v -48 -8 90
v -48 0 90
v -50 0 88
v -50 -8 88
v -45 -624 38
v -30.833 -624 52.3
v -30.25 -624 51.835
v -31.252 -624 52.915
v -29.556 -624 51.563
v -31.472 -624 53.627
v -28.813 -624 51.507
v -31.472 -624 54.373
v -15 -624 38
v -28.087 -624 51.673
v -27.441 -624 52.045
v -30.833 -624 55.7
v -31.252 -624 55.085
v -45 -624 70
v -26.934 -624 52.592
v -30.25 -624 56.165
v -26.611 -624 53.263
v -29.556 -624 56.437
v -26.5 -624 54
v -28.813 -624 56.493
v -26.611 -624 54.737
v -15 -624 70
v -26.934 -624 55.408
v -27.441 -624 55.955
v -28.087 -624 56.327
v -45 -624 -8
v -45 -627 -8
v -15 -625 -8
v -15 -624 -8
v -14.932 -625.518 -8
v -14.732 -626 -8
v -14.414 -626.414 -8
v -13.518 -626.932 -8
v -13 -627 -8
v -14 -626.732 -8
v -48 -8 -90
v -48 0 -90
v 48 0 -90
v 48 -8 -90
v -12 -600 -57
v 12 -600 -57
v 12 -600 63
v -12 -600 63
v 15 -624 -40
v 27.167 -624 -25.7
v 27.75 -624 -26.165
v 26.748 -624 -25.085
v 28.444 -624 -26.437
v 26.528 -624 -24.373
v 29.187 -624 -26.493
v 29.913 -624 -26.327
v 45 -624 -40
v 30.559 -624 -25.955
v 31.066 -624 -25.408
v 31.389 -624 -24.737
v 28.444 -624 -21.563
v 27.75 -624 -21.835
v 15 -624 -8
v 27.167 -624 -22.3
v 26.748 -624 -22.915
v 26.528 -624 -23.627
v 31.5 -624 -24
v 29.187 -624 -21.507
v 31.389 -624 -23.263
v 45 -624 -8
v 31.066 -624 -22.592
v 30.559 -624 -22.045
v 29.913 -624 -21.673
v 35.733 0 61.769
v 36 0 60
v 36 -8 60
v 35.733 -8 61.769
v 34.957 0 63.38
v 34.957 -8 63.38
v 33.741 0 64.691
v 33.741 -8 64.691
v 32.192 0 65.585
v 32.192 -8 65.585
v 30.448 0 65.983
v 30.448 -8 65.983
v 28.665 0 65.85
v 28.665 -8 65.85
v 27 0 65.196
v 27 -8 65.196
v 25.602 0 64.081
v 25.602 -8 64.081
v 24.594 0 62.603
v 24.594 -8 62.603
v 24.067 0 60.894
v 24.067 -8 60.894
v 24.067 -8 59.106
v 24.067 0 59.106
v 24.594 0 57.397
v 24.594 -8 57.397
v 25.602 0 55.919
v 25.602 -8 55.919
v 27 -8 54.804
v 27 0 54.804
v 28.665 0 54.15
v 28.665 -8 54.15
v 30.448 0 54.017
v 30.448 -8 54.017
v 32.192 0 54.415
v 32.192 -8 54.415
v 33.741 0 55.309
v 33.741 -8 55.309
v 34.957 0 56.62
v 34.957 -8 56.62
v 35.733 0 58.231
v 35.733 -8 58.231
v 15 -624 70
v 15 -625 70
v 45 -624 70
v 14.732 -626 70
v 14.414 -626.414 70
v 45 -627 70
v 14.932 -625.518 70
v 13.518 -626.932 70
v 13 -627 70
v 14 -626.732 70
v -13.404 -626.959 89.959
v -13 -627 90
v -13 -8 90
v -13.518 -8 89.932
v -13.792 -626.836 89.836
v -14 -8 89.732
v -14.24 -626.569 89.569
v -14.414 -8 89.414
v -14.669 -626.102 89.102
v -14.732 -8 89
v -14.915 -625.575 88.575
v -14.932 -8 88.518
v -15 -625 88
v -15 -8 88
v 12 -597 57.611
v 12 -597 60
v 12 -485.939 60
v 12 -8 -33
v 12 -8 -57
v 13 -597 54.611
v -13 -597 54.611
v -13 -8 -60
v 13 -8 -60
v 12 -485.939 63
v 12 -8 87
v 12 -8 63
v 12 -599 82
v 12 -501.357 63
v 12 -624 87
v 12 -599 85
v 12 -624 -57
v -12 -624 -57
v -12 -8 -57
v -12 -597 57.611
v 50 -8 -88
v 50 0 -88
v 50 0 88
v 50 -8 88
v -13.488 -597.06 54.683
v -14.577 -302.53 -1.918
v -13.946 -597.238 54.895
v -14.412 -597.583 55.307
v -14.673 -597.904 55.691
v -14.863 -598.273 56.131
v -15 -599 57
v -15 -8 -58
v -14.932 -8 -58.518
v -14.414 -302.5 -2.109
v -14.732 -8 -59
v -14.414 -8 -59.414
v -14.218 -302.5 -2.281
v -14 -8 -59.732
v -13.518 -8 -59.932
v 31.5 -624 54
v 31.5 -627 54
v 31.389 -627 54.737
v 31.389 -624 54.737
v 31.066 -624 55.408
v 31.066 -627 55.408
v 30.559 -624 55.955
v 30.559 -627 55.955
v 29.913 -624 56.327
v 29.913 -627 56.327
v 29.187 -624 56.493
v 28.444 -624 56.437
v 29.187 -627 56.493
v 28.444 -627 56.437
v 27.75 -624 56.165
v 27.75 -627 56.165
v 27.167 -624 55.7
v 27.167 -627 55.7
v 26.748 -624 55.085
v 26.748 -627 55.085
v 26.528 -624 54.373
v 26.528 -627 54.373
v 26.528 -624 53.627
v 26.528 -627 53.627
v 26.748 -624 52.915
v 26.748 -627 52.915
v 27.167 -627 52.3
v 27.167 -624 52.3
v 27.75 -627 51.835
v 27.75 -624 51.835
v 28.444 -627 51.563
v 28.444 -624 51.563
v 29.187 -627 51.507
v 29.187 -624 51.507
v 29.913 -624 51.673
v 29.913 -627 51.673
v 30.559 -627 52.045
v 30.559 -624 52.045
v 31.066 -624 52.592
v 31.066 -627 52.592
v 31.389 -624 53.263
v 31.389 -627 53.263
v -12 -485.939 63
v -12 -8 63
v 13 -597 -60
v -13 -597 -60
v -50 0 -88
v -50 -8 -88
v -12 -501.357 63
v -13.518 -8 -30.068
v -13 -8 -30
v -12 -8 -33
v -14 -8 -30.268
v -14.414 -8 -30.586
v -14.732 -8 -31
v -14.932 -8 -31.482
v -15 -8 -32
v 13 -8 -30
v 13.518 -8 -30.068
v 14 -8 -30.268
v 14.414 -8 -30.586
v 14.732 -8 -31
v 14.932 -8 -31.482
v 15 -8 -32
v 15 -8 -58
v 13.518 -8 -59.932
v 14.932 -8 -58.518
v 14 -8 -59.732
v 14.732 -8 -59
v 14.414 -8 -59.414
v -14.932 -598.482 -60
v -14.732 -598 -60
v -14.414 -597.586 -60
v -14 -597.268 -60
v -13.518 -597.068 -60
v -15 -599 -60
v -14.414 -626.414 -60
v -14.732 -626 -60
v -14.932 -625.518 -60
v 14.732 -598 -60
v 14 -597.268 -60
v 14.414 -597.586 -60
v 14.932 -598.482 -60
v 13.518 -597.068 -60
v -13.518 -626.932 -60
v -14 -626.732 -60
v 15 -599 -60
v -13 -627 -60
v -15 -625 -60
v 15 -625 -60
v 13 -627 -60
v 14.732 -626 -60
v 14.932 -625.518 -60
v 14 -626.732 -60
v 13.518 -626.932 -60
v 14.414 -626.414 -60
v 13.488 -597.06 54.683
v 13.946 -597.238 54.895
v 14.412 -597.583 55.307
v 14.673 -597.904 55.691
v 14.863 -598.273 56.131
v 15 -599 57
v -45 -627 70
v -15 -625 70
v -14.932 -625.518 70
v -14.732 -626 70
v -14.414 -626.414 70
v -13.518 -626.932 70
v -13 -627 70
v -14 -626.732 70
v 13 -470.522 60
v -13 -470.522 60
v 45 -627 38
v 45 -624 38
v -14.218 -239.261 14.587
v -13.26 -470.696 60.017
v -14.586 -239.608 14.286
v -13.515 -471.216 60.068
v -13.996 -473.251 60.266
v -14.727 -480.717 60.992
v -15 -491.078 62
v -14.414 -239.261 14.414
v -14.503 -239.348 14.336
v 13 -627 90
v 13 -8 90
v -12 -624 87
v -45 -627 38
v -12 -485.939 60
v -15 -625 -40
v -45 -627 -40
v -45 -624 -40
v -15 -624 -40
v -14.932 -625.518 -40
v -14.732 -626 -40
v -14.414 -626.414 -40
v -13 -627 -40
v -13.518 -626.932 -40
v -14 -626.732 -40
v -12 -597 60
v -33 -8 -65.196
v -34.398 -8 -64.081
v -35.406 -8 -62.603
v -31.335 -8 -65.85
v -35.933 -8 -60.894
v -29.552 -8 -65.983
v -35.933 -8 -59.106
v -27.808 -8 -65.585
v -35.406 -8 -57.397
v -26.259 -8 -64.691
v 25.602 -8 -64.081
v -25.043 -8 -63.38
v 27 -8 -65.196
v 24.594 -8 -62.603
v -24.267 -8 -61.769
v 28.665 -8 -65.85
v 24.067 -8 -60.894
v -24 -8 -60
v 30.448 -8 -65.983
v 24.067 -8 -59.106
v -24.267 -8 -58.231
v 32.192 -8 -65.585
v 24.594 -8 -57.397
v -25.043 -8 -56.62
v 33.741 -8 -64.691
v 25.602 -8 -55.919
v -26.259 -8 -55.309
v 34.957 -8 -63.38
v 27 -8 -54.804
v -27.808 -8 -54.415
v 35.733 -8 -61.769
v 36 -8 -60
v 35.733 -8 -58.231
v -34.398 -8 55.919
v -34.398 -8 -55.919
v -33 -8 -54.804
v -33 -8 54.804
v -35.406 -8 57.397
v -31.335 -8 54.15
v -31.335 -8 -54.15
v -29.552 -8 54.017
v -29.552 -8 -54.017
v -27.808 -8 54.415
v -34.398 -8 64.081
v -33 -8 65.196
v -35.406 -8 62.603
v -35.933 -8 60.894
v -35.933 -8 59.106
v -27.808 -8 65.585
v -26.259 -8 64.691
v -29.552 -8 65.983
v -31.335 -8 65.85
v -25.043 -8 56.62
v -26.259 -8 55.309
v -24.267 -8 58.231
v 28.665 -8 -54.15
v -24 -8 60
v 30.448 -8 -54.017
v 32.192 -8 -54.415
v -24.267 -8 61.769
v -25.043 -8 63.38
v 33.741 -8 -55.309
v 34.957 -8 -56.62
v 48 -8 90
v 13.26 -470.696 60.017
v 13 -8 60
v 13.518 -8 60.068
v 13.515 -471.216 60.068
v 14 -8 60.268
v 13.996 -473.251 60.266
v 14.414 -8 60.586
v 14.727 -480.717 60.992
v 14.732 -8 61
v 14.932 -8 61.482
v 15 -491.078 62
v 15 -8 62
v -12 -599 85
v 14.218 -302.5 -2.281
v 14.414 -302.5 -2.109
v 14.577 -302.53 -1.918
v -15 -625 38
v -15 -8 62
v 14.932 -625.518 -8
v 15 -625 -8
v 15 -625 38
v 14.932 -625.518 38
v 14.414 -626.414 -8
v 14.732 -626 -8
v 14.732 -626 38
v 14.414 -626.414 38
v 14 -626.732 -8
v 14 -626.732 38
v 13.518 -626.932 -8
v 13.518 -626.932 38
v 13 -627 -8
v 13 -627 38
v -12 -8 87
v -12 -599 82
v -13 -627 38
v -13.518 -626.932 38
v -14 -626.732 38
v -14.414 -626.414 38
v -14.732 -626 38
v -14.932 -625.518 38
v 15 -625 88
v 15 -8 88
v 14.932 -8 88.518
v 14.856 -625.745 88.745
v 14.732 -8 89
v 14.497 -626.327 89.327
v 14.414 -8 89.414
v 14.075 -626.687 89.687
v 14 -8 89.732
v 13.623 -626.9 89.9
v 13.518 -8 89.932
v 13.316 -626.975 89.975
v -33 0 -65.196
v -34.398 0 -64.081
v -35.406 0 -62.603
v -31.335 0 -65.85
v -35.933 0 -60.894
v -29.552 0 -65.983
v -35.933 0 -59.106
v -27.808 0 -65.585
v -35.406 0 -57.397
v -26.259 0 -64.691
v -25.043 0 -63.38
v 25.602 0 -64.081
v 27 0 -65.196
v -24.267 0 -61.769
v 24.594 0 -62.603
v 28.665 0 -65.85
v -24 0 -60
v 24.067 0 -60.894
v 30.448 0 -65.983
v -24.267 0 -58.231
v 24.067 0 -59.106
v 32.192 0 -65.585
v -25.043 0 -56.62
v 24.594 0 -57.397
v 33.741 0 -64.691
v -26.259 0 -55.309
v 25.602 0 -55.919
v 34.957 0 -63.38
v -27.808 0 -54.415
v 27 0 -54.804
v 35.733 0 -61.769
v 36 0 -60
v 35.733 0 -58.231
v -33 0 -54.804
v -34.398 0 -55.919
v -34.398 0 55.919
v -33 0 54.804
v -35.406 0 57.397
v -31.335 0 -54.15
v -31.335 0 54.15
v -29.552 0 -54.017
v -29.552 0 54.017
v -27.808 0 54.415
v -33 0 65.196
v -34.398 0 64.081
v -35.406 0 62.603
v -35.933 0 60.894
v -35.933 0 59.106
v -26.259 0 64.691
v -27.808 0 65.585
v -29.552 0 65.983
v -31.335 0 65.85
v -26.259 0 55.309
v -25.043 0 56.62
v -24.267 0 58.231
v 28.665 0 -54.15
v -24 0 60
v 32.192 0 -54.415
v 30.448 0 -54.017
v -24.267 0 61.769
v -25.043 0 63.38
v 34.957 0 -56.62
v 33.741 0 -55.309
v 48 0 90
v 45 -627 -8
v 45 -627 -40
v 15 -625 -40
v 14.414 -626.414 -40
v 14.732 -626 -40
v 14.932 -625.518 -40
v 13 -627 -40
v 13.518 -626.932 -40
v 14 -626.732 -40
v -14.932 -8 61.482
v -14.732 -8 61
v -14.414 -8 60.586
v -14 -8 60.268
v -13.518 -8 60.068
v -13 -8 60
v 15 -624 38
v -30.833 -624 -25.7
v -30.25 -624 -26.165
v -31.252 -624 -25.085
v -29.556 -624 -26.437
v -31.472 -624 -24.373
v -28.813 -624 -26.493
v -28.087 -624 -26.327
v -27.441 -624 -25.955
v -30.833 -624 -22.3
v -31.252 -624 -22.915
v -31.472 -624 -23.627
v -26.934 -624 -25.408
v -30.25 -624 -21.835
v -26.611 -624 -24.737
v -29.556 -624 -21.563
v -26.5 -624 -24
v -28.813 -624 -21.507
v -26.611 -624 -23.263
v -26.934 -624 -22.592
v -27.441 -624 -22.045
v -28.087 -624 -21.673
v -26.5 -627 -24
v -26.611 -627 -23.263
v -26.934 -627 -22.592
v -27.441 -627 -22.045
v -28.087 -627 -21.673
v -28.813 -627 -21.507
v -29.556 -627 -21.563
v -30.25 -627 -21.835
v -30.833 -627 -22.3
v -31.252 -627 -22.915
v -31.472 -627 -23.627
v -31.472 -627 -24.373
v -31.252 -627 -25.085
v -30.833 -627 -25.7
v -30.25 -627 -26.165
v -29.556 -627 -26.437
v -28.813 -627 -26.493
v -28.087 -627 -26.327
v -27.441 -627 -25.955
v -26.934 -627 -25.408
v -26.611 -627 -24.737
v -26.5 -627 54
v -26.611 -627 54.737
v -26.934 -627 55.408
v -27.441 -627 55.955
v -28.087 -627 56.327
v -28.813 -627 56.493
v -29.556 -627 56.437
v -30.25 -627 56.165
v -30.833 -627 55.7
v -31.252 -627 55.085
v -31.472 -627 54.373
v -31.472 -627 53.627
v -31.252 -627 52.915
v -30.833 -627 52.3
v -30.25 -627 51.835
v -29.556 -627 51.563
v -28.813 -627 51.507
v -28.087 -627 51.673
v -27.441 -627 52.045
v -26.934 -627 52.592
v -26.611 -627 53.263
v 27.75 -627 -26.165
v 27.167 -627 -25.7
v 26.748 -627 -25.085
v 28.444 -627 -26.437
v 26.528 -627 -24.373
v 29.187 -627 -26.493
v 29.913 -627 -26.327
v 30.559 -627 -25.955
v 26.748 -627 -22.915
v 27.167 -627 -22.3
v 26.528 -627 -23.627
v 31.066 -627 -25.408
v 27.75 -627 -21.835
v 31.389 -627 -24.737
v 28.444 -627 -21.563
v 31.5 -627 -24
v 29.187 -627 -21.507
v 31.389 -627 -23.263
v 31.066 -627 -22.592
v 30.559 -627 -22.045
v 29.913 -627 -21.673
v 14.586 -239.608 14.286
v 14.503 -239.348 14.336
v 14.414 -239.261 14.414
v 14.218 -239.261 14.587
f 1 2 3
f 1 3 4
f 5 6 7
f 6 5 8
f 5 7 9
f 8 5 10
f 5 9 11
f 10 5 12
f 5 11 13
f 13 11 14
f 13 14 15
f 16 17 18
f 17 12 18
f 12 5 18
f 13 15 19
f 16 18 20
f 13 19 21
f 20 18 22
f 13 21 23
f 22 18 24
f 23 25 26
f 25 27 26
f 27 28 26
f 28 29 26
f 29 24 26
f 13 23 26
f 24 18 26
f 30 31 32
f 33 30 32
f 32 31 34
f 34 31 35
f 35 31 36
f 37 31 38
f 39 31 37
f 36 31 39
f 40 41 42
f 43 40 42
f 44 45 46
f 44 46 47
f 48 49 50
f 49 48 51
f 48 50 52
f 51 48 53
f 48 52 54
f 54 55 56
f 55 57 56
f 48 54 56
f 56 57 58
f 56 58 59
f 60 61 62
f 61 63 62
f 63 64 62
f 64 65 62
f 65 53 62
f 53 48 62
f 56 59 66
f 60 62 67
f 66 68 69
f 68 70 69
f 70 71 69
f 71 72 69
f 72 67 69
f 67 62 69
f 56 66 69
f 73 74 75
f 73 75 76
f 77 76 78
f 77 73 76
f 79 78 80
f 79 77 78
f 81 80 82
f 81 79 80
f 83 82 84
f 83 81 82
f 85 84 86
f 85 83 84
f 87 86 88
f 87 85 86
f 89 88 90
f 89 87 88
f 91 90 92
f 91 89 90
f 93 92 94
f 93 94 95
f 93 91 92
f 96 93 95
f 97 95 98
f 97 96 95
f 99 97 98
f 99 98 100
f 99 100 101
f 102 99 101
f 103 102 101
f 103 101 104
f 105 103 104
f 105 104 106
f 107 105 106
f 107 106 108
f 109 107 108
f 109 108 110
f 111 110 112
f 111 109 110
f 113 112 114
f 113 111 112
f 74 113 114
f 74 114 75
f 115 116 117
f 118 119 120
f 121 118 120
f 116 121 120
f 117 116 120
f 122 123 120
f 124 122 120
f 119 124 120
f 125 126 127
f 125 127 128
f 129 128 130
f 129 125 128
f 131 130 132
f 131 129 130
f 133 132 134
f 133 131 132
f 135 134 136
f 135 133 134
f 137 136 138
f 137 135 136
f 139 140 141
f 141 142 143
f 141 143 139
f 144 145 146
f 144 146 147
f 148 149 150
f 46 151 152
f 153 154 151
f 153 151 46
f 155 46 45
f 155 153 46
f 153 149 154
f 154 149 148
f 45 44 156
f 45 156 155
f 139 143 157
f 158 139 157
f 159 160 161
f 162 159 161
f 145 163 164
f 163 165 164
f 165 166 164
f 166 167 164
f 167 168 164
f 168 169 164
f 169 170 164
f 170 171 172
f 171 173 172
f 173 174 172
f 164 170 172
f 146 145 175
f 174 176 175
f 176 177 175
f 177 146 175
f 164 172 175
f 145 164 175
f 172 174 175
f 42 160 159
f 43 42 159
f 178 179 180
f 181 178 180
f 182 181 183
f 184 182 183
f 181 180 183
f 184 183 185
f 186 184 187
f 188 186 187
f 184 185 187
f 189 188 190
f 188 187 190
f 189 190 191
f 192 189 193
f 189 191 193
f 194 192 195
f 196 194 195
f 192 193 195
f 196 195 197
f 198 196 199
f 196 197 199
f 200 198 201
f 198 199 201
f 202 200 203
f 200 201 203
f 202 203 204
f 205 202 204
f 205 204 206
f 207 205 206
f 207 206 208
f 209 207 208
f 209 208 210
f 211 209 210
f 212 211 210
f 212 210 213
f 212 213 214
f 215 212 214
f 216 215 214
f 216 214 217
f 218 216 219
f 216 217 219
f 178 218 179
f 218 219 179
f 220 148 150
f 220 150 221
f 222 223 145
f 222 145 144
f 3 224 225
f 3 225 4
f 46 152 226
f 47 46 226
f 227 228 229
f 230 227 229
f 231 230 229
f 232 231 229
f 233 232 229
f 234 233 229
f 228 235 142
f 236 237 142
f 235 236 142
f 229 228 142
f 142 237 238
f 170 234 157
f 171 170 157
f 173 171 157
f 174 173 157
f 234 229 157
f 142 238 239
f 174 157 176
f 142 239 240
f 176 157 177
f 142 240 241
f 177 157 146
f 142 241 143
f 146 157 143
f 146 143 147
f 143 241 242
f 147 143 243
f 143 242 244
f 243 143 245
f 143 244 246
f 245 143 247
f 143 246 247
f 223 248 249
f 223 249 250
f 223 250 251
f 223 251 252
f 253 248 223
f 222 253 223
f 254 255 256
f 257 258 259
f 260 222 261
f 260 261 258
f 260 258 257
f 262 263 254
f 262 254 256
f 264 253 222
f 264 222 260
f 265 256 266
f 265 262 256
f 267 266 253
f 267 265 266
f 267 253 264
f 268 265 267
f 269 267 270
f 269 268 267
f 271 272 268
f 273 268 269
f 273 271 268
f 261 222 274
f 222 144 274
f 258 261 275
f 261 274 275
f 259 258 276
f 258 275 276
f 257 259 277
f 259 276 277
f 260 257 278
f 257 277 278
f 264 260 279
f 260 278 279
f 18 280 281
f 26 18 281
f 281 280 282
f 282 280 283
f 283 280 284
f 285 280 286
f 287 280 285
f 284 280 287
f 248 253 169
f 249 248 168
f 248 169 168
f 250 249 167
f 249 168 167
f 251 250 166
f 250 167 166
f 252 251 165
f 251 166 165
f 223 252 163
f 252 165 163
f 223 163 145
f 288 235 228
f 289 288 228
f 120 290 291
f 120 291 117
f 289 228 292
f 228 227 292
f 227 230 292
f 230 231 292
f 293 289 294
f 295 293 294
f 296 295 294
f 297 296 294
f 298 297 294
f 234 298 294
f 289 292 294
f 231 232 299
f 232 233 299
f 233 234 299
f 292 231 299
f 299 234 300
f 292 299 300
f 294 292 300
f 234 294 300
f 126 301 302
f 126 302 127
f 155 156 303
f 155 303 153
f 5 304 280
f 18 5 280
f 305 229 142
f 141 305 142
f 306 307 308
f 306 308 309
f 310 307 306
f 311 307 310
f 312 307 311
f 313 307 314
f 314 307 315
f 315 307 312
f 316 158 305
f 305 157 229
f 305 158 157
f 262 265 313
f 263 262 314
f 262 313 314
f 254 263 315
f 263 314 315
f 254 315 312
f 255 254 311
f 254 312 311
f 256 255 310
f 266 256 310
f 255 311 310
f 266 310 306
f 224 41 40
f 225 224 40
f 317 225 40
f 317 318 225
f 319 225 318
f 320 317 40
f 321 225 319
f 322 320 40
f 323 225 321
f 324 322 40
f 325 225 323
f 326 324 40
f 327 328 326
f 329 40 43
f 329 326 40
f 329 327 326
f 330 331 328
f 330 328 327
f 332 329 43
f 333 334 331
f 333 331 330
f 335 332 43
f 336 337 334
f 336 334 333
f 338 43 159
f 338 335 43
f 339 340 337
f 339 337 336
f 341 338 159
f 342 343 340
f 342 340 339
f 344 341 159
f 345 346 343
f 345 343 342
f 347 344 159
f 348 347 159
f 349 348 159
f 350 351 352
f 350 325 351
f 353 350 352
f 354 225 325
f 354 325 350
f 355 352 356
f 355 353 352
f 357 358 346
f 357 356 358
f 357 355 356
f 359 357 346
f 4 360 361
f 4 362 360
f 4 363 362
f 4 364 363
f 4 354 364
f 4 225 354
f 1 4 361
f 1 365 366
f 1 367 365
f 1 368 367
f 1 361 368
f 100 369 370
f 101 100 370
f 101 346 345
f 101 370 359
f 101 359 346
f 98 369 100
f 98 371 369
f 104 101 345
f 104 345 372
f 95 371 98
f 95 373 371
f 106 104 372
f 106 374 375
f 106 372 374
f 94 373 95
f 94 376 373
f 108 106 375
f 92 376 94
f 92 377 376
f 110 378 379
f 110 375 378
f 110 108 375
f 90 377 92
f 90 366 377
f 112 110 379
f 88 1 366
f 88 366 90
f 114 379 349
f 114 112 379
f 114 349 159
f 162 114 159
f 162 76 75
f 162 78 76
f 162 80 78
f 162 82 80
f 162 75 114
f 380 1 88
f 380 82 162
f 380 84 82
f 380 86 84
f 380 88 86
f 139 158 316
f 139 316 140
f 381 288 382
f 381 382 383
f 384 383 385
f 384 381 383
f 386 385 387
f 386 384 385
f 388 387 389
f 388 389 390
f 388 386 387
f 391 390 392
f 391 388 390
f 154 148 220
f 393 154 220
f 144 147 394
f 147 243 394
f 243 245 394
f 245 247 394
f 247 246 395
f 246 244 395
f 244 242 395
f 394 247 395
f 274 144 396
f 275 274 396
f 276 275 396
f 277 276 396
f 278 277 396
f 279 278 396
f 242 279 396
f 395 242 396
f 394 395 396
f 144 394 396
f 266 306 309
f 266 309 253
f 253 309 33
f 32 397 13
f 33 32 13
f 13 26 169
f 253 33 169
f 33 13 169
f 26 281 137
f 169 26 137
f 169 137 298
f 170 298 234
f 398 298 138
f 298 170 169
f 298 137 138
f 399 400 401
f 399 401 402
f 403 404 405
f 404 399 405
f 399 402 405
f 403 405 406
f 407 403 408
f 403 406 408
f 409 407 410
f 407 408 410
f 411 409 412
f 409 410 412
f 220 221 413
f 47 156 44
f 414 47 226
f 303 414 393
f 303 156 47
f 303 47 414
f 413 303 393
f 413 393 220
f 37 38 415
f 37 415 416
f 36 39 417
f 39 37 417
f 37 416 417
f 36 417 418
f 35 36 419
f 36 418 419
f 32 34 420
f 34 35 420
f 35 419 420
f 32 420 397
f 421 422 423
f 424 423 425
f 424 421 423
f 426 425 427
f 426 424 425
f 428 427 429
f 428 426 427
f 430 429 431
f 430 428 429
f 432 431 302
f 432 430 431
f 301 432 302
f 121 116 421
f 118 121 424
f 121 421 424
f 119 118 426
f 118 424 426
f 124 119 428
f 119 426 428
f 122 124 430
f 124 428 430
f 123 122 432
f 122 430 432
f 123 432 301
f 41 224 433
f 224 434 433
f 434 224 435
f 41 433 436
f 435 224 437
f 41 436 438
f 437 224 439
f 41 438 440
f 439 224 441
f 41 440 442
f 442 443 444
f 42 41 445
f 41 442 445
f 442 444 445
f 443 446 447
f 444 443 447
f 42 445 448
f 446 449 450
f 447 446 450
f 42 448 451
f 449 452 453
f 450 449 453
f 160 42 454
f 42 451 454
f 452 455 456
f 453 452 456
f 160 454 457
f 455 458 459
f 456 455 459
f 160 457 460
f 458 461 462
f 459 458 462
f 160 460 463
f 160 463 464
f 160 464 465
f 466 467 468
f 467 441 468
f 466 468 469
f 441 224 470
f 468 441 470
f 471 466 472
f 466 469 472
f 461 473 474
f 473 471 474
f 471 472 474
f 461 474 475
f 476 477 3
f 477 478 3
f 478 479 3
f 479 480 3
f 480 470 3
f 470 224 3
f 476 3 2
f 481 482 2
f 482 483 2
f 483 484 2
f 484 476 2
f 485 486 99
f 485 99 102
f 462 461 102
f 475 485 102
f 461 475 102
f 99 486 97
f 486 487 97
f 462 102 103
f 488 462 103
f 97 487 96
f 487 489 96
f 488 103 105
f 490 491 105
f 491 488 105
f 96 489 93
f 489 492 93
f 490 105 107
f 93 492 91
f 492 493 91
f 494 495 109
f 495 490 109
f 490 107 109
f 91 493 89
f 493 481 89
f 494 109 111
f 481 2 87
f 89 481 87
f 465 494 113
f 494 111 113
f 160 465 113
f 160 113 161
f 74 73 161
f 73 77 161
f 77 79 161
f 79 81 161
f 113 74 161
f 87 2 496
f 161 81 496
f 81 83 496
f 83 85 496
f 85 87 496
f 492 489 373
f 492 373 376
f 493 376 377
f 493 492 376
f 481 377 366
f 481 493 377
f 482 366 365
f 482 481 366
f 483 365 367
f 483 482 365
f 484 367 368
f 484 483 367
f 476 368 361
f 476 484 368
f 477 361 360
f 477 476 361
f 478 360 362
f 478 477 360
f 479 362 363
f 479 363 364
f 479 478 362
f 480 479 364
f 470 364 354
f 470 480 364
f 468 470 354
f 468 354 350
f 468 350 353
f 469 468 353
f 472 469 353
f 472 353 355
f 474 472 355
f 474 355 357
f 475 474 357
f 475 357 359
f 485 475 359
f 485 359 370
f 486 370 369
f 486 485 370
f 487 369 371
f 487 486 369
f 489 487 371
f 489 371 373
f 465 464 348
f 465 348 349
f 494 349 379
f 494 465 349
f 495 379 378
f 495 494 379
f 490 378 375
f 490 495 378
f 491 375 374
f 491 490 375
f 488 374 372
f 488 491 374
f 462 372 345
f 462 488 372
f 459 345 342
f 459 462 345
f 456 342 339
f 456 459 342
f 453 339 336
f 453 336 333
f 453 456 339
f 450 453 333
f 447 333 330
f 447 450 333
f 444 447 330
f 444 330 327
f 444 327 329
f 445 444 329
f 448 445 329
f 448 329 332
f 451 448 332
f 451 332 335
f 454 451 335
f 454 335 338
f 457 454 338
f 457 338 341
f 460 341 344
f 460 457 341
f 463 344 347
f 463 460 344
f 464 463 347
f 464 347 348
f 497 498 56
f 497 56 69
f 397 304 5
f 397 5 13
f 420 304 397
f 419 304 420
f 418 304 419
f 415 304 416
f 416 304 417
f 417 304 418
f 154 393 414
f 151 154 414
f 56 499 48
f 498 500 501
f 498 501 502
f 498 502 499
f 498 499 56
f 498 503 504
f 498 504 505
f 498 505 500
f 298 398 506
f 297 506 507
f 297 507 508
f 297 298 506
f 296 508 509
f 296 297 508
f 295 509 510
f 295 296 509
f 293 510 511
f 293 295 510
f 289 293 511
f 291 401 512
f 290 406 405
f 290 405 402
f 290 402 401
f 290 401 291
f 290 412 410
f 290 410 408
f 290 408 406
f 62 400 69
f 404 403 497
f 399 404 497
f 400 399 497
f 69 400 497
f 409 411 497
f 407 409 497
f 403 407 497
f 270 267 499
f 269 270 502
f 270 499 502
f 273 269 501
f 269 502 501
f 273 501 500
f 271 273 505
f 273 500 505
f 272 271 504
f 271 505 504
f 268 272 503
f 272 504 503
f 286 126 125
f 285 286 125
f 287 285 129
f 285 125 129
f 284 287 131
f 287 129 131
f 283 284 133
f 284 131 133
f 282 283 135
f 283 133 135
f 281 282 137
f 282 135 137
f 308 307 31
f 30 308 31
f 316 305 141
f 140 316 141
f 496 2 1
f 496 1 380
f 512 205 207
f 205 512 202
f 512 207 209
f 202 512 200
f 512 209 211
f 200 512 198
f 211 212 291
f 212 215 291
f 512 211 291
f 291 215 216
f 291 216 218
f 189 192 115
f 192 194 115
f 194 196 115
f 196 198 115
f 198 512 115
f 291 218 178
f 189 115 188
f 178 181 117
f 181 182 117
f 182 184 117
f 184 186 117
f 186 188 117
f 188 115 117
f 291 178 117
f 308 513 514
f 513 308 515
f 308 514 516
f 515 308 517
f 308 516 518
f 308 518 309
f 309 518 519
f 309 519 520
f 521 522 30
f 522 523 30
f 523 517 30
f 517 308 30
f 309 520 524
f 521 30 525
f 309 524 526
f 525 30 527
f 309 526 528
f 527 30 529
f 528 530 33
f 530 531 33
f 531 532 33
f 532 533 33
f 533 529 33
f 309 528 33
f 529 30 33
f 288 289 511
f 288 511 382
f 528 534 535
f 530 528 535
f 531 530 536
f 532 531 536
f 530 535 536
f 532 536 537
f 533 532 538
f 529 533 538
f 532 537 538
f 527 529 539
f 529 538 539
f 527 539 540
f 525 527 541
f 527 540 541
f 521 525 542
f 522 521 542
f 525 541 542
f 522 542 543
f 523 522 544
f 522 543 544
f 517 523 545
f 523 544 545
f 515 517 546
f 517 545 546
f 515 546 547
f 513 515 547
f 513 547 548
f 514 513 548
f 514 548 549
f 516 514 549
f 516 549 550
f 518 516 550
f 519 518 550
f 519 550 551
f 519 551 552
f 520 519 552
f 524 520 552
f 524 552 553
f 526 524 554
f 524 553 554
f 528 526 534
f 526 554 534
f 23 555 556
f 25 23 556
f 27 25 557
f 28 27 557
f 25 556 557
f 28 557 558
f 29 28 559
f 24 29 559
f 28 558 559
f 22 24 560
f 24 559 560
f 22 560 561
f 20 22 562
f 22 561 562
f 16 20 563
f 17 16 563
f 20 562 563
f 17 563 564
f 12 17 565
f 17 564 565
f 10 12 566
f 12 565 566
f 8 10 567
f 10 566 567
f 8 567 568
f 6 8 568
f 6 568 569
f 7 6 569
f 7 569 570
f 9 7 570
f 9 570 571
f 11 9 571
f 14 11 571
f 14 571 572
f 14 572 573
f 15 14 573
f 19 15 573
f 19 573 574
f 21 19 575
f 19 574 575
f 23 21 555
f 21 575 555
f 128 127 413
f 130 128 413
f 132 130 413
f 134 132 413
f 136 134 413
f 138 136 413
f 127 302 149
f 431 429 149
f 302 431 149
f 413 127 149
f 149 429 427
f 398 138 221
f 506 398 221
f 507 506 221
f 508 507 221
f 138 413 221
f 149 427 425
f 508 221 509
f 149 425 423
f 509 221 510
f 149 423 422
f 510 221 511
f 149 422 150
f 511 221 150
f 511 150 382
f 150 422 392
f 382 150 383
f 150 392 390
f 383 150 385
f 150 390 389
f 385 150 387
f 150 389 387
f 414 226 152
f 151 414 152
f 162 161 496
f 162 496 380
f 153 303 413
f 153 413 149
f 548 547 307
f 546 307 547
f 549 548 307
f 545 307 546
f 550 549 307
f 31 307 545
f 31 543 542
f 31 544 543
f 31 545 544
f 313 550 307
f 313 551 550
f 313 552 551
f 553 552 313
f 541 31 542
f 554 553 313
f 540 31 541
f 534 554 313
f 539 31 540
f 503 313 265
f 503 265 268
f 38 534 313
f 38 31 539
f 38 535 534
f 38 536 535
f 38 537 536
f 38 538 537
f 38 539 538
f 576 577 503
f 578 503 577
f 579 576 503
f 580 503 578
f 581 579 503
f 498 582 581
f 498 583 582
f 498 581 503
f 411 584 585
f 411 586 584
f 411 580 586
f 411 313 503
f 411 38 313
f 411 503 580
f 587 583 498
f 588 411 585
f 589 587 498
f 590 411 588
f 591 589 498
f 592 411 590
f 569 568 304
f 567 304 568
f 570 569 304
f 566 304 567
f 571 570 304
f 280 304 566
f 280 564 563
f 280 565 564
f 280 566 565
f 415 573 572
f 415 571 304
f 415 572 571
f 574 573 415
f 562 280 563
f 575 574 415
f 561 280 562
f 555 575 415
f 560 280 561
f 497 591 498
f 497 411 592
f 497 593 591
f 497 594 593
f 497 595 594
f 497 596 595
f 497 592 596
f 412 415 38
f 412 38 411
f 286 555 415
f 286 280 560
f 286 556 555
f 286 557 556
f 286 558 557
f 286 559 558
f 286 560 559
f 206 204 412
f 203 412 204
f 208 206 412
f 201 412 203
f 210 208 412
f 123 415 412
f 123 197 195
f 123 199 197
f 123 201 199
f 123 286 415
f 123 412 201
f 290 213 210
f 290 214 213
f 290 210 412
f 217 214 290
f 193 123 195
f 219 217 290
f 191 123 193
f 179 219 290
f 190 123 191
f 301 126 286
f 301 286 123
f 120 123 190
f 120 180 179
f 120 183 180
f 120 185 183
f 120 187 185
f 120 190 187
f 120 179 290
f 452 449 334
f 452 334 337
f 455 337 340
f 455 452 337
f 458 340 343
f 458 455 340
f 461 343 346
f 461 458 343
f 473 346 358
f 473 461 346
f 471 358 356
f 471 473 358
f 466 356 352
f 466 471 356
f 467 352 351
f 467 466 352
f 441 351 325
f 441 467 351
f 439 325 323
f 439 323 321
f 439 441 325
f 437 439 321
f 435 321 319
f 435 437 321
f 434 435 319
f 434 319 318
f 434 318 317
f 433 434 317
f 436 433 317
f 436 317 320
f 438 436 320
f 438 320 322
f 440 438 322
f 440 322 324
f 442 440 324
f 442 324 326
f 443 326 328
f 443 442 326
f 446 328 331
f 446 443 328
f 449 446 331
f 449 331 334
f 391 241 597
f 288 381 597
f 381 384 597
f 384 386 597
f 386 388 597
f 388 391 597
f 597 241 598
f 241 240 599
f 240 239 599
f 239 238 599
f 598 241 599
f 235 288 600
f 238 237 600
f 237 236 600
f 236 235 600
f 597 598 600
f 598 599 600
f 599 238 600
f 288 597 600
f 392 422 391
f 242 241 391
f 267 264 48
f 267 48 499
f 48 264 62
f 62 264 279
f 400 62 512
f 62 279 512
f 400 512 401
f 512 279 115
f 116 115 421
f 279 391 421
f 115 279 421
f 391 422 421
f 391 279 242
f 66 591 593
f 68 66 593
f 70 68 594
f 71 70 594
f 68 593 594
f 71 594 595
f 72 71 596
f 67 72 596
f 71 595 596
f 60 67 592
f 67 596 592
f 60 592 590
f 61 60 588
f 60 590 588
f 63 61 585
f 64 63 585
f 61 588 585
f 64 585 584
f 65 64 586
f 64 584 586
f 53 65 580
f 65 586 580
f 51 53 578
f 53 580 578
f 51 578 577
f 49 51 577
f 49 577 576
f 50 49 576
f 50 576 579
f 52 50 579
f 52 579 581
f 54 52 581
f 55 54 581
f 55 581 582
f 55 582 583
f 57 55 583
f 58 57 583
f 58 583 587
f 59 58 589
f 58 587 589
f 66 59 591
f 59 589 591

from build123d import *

# Parameters (mm, degrees)
F0_W      = 100
F0_H      = 180
F0_R      = 6
F1_DEPTH  = 8
F2_SIZE   = 2
F4_W      = 24
F4_H      = 24
F8_DEPTH  = 3
F9_W      = 32
F9_H      = 32
F9_R      = 2.5
F10_DEPTH = 3


with BuildPart() as f1:
    # F0 (on Front) → F1 (new body)
    with BuildSketch(Plane.XZ):
        Rectangle(F0_W, F0_H)
        with Locations((-30, -60)):
            Circle(F0_R, mode=Mode.SUBTRACT)
        with Locations((30, -60)):
            Circle(F0_R, mode=Mode.SUBTRACT)
        with Locations((-30, 60)):
            Circle(F0_R, mode=Mode.SUBTRACT)
        with Locations((30, 60)):
            Circle(F0_R, mode=Mode.SUBTRACT)
    extrude(amount=F1_DEPTH)

    # F2
    f2_edges = [f1.edges().sort_by_distance(p)[0] for p in [
        (50, -4, 90),
        (50, -4, -90),
        (-50, -4, -90),
        (-50, -4, 90),
    ]]
    chamfer(f2_edges, length=F2_SIZE)


with BuildPart() as f5:
    # F5: sweep along a path in F3
    with BuildLine(Plane.YZ) as f5_path:
        Line((-8, 90), (-627, 90))
        Line((-627, 90), (-627, -57))
    # F4 (on face) → F5 (sweep)
    with BuildSketch(Plane.XZ.offset(8)):
        with BuildLine():
            Line((13, 90), (-13, 90))
            ThreePointArc((-13, 90), (-14.4142135624, 89.4142135624), (-15, 88))
            Line((-15, 88), (-15, 62))
            ThreePointArc((-15, 62), (-14.4142135624, 60.5857864376), (-13, 60))
            Line((-13, 60), (13, 60))
            ThreePointArc((13, 60), (14.4142135624, 60.5857864376), (15, 62))
            Line((15, 62), (15, 88))
            ThreePointArc((15, 88), (14.4142135624, 89.4142135624), (13, 90))
        make_face()
        with Locations((0, 75)):
            Rectangle(F4_W, F4_H, mode=Mode.SUBTRACT)
    sweep(path=f5_path.line, transition=Transition.RIGHT)

    # F6: sweep along a path in F3
    with BuildLine(Plane.YZ) as f6_path:
        Line((-599, 55), (-8, -60))
    # F4 (on face) → F6 (sweep)
    with BuildSketch(Plane.XZ.offset(8)):
        with BuildLine():
            Line((13, -30), (-13, -30))
            ThreePointArc((-13, -30), (-14.4142135624, -30.5857864376), (-15, -32))
            Line((-15, -32), (-15, -58))
            ThreePointArc((-15, -58), (-14.4142135624, -59.4142135624), (-13, -60))
            Line((-13, -60), (13, -60))
            ThreePointArc((13, -60), (14.4142135624, -59.4142135624), (15, -58))
            Line((15, -58), (15, -32))
            ThreePointArc((15, -32), (14.4142135624, -30.5857864376), (13, -30))
        make_face()
        with Locations((0, -45)):
            Rectangle(F4_W, F4_H, mode=Mode.SUBTRACT)
    sweep(path=f6_path.line)

    # F7 (on face) → F8 (join)
    with BuildSketch(Plane(origin=(0, 0, -57), x_dir=(1, 0, 0), z_dir=(0, 0, -1))):
        with BuildLine():
            ThreePointArc((-13, 627), (-14.4142135624, 626.4142135624), (-15, 625))
            Line((-15, 625), (-15, 599))
            ThreePointArc((-15, 599), (-14.4142135624, 597.5857864376), (-13, 597))
            Line((-13, 597), (13, 597))
            ThreePointArc((13, 597), (14.4142135624, 597.5857864376), (15, 599))
            Line((15, 599), (15, 625))
            ThreePointArc((15, 625), (14.4142135624, 626.4142135624), (13, 627))
            Line((13, 627), (-13, 627))
        make_face()
    extrude(amount=F8_DEPTH)

    # F9 (on face) → F10 (join)
    with BuildSketch(Plane.XZ.offset(627)):
        with Locations((29, 54)):
            Rectangle(F9_W, F9_H)
        with Locations((29, 54)):
            Circle(F9_R, mode=Mode.SUBTRACT)
        with Locations((29, -24)):
            Rectangle(F9_W, F9_H)
        with Locations((29, -24)):
            Circle(F9_R, mode=Mode.SUBTRACT)
        with Locations((-29, -24)):
            Rectangle(F9_W, F9_H)
        with Locations((-29, -24)):
            Circle(F9_R, mode=Mode.SUBTRACT)
        with Locations((-29, 54)):
            Rectangle(F9_W, F9_H)
        with Locations((-29, 54)):
            Circle(F9_R, mode=Mode.SUBTRACT)
    extrude(amount=-F10_DEPTH)


solid = Compound([f1.part, f5.part])
